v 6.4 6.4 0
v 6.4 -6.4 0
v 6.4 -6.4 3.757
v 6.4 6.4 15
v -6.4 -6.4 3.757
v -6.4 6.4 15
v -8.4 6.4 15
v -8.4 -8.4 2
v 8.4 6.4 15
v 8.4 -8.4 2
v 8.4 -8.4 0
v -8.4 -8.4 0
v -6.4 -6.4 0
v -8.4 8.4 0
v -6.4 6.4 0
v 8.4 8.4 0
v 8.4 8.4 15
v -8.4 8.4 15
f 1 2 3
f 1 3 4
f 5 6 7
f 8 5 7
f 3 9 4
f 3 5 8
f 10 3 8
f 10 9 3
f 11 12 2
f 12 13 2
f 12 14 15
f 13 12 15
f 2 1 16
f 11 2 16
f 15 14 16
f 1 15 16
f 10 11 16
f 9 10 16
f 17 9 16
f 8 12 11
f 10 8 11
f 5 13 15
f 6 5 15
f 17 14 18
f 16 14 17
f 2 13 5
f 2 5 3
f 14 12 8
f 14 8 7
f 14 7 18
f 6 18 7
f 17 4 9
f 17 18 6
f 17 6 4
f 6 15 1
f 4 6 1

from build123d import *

# Parameters (mm, degrees)
SKETCH1_W           = 16.8
SKETCH1_H           = 16.8
SKETCH1_W_2         = 12.8
SKETCH1_H_2         = 12.8
BOSS_EXTRUDE1_DEPTH = 15
CUT_EXTRUDE1_DEPTH  = 17.8


with BuildPart() as part:
    # Sketch1 → Boss-Extrude1 (new body)
    with BuildSketch(Plane.XY):
        Rectangle(SKETCH1_W, SKETCH1_H)
        Rectangle(SKETCH1_W_2, SKETCH1_H_2, mode=Mode.SUBTRACT)
    extrude(amount=BOSS_EXTRUDE1_DEPTH)

    # Sketch2 → Cut-Extrude1 (cut, through all)
    with BuildSketch(Plane(origin=(8.4, 0, 0), x_dir=(0, 0, -1), z_dir=(1, 0, 0))):
        Polygon((-15, 6.4), (-2, -8.4), (-15, -8.4), align=None)
    extrude(amount=-CUT_EXTRUDE1_DEPTH, mode=Mode.SUBTRACT)


solid = part.part
